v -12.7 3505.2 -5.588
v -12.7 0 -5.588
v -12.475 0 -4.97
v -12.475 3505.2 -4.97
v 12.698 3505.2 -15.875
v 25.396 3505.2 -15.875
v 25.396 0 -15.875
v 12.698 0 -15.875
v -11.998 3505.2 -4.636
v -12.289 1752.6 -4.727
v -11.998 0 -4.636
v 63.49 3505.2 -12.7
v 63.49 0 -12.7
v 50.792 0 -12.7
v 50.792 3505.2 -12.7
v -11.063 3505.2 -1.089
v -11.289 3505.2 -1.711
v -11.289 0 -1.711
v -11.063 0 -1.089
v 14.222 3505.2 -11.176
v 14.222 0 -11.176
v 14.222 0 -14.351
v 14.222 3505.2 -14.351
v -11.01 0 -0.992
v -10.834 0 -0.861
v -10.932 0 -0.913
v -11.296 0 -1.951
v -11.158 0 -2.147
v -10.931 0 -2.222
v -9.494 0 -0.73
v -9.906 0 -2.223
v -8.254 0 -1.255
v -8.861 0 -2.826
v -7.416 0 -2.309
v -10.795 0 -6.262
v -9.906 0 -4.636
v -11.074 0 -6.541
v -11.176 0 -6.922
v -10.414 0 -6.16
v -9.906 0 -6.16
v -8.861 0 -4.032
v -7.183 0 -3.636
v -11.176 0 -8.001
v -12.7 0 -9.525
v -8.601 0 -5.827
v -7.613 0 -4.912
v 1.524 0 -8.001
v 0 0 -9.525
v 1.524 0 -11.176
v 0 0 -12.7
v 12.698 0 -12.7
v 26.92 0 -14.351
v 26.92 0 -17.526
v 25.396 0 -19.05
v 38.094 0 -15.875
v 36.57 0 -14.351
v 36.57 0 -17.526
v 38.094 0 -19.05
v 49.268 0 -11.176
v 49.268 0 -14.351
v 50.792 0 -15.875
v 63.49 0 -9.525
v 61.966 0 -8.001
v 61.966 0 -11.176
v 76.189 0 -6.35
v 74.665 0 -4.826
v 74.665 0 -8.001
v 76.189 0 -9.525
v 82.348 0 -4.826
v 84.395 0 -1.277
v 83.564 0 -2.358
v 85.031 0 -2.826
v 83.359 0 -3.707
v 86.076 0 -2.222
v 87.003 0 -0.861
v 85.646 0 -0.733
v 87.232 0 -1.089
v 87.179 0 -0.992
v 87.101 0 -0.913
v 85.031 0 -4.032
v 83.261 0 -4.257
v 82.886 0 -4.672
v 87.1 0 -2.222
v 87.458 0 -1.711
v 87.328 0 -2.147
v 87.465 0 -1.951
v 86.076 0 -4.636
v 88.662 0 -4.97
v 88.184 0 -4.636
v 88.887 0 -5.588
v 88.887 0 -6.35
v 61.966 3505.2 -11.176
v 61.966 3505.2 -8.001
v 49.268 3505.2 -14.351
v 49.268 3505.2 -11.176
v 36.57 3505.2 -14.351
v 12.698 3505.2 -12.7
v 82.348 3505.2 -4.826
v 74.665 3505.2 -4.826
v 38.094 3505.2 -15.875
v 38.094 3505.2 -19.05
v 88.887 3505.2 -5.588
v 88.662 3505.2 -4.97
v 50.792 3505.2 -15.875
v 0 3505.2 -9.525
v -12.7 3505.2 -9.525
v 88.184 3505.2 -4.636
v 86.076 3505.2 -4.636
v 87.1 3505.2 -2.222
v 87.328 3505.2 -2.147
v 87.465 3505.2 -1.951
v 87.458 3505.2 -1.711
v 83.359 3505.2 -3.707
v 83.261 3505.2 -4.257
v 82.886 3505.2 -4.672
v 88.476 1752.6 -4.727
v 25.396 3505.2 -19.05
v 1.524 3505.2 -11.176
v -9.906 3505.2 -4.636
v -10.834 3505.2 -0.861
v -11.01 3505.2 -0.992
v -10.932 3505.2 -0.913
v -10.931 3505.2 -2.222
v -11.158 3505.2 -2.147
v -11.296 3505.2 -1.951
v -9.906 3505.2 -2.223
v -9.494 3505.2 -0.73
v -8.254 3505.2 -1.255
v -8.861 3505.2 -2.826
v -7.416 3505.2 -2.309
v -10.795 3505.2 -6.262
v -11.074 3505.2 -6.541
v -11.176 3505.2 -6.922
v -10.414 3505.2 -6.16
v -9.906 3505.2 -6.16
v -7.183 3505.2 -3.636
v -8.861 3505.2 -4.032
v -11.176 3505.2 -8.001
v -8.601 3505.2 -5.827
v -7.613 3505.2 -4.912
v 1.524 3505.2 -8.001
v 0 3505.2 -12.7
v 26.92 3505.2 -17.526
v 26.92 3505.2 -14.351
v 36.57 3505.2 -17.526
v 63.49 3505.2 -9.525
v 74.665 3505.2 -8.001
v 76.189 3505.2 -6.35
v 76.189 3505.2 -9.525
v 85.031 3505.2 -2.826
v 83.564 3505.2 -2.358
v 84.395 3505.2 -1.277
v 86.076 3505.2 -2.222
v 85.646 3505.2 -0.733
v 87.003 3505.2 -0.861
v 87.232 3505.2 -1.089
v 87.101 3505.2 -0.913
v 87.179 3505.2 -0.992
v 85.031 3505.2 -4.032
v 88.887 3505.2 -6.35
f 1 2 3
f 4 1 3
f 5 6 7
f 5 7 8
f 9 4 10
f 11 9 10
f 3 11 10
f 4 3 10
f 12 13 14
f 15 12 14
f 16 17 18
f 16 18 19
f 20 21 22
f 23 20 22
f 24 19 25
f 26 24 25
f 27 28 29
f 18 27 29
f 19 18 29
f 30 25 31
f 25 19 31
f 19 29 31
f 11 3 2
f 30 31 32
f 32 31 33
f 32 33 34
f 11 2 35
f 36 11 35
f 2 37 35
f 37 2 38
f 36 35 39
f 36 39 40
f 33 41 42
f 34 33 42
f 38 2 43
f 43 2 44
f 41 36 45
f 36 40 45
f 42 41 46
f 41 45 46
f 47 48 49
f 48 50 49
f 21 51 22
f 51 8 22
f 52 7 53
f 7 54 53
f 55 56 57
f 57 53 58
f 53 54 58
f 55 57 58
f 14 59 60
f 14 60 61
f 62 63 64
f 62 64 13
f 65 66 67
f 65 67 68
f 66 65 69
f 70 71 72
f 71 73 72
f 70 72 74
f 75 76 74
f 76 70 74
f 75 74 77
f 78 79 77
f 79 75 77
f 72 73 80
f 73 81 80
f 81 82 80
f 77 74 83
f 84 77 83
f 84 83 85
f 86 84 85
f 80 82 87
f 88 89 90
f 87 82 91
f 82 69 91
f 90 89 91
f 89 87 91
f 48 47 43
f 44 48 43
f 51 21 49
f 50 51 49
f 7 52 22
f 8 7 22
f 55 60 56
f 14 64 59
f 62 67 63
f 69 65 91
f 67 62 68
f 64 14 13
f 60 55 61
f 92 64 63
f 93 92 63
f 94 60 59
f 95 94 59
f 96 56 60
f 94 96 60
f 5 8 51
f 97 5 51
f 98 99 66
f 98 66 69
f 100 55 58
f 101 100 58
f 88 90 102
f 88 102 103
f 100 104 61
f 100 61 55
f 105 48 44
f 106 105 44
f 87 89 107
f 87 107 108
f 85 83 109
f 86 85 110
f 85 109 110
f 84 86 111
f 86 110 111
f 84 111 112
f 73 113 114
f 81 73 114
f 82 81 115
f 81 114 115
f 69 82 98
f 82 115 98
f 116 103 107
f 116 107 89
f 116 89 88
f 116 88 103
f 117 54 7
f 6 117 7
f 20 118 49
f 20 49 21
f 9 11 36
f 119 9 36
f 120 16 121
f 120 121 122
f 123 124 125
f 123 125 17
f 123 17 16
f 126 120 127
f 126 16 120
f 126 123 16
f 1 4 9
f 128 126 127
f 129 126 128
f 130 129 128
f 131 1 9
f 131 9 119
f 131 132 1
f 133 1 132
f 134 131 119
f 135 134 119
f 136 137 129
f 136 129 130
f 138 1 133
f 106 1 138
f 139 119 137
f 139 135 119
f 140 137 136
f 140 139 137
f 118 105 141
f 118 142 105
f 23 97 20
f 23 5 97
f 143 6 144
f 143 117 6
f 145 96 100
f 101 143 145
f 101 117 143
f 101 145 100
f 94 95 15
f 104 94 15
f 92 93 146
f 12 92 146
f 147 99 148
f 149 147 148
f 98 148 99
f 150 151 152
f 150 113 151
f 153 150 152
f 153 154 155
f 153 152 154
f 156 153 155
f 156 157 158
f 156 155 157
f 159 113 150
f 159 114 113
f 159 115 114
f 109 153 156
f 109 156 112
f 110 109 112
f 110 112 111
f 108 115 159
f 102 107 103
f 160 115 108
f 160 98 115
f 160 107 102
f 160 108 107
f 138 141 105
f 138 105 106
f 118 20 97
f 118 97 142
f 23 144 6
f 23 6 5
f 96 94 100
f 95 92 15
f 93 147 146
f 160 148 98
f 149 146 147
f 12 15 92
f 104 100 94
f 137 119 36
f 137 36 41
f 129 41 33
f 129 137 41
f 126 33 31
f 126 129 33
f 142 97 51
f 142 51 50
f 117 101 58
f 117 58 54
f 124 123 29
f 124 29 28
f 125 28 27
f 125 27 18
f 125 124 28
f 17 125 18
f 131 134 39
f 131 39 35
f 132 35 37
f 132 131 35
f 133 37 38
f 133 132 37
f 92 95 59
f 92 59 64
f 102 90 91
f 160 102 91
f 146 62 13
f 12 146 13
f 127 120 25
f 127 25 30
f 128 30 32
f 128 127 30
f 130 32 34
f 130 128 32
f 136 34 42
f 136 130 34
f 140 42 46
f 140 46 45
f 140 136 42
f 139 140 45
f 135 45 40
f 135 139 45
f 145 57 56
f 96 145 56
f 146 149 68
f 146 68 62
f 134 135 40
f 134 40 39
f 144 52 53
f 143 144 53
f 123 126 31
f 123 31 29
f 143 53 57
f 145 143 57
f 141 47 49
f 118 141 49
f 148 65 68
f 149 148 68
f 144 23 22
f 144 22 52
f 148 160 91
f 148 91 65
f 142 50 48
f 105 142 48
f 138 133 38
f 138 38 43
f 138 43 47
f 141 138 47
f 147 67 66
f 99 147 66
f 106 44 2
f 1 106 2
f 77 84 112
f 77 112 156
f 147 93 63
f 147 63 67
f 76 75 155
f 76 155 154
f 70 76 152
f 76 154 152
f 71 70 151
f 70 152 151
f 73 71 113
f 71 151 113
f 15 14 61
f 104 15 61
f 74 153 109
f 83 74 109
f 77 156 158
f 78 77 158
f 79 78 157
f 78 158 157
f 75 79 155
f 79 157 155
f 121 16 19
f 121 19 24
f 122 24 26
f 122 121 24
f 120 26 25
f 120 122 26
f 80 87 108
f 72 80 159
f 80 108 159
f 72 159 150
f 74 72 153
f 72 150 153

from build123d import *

# Parameters (mm, degrees)
BOSS_EXTRUDE1_DEPTH = 3505.2
CUT_EXTRUDE1_DEPTH  = 3506.2
BOSS_EXTRUDE2_DEPTH = 3505.2
FILLET1_R           = 0.508


with BuildPart() as part:
    # Sketch1 → Boss-Extrude1 (new body)
    with BuildSketch(Plane(origin=(0, 0, 0), x_dir=(1, 0, 0), z_dir=(0, 1, 0))):
        Polygon((0, 9.525), (0, 8.001), (1.524, 8.001), (1.524, 11.176), (14.222095, 11.176), (14.222095, 14.351), (26.92019, 14.351), (26.92019, 17.526), (36.570285, 17.526), (36.570285, 14.351), (49.26838, 14.351), (49.26838, 11.176), (61.966475, 11.176), (61.966475, 8.001), (74.66457, 8.001), (74.66457, 4.826), (88.886665, 4.826), (88.886665, 6.35), (76.18857, 6.35), (76.18857, 9.525), (63.490475, 9.525), (63.490475, 12.7), (50.79238, 12.7), (50.79238, 15.875), (38.094285, 15.875), (38.094285, 19.05), (25.39619, 19.05), (25.39619, 15.875), (12.698095, 15.875), (12.698095, 12.7), (0, 12.7), align=None)
        Polygon((-11.176, 8.001), (0, 8.001), (0, 9.525), (-12.7, 9.525), (-12.7, 4.826), (-11.176, 4.826), align=None)
    extrude(amount=BOSS_EXTRUDE1_DEPTH)

    # Sketch2 → Cut-Extrude1 (cut, through all)
    with BuildSketch(Plane(origin=(0, 3505.2, 0), x_dir=(1, 0, 0), z_dir=(0, 1, 0))):
        Polygon((88.886665, 5.588), (88.609319681, 4.826), (88.886665, 4.826), align=None)
        Polygon((-12.7, 5.588), (-12.422654681, 4.826), (-12.7, 4.826), align=None)
    extrude(amount=-CUT_EXTRUDE1_DEPTH, mode=Mode.SUBTRACT)

    # Sketch3 → Boss-Extrude2 (add, through all)
    with BuildSketch(Plane(origin=(0, 3505.2, 0), x_dir=(1, 0, 0), z_dir=(0, 1, 0))):
        with BuildLine():
            Line((-12.422654681, 4.826), (-12.353318352, 4.6355))
            Line((-12.353318352, 4.6355), (-9.906, 4.6355))
            ThreePointArc((-9.906, 4.6355), (-8.6995, 3.429), (-9.906, 2.2225))
            Line((-9.906, 2.2225), (-10.930933786, 2.2225))
            ThreePointArc((-10.930933786, 2.2225), (-11.243030715, 2.060032622), (-11.288956675, 1.711190325))
            Line((-11.288956675, 1.711190325), (-11.06251152, 1.089037376))
            ThreePointArc((-11.06251152, 1.089037376), (-10.973585853, 0.949629263), (-10.833973274, 0.861024951))
            ThreePointArc((-10.833973274, 0.861024951), (-7.216438129, 2.957950969), (-9.906, 6.1595))
            Line((-9.906, 6.1595), (-10.414, 6.1595))
            ThreePointArc((-10.414, 6.1595), (-10.952815367, 6.382684633), (-11.176, 6.9215))
            Line((-11.176, 6.9215), (-11.176, 4.826))
            Line((-11.176, 4.826), (-12.422654681, 4.826))
        make_face()
        with BuildLine():
            Line((87.458476675, 1.711190325), (87.23203152, 1.089037376))
            ThreePointArc((87.23203152, 1.089037376), (87.143105853, 0.949629263), (87.003493274, 0.861024951))
            ThreePointArc((87.003493274, 0.861024951), (84.395043041, 1.276878387), (83.359175913, 3.706677966))
            ThreePointArc((83.359175913, 3.706677966), (83.10250927, 4.490911453), (82.34844323, 4.826))
            Line((82.34844323, 4.826), (88.609319681, 4.826))
            Line((88.609319681, 4.826), (88.522838352, 4.6355))
            Line((88.522838352, 4.6355), (86.07552, 4.6355))
            ThreePointArc((86.07552, 4.6355), (84.86902, 3.429), (86.07552, 2.2225))
            Line((86.07552, 2.2225), (87.100453786, 2.2225))
            ThreePointArc((87.100453786, 2.2225), (87.412550715, 2.060032622), (87.458476675, 1.711190325))
        make_face()
    extrude(amount=-BOSS_EXTRUDE2_DEPTH)

    # Fillet1
    fillet1_edges = [part.edges().sort_by_distance(p)[0] for p in [
        (88.522838352, 1752.6, -4.6355),
        (-12.353318352, 1752.6, -4.6355),
    ]]
    fillet(fillet1_edges, radius=FILLET1_R)


solid = part.part
